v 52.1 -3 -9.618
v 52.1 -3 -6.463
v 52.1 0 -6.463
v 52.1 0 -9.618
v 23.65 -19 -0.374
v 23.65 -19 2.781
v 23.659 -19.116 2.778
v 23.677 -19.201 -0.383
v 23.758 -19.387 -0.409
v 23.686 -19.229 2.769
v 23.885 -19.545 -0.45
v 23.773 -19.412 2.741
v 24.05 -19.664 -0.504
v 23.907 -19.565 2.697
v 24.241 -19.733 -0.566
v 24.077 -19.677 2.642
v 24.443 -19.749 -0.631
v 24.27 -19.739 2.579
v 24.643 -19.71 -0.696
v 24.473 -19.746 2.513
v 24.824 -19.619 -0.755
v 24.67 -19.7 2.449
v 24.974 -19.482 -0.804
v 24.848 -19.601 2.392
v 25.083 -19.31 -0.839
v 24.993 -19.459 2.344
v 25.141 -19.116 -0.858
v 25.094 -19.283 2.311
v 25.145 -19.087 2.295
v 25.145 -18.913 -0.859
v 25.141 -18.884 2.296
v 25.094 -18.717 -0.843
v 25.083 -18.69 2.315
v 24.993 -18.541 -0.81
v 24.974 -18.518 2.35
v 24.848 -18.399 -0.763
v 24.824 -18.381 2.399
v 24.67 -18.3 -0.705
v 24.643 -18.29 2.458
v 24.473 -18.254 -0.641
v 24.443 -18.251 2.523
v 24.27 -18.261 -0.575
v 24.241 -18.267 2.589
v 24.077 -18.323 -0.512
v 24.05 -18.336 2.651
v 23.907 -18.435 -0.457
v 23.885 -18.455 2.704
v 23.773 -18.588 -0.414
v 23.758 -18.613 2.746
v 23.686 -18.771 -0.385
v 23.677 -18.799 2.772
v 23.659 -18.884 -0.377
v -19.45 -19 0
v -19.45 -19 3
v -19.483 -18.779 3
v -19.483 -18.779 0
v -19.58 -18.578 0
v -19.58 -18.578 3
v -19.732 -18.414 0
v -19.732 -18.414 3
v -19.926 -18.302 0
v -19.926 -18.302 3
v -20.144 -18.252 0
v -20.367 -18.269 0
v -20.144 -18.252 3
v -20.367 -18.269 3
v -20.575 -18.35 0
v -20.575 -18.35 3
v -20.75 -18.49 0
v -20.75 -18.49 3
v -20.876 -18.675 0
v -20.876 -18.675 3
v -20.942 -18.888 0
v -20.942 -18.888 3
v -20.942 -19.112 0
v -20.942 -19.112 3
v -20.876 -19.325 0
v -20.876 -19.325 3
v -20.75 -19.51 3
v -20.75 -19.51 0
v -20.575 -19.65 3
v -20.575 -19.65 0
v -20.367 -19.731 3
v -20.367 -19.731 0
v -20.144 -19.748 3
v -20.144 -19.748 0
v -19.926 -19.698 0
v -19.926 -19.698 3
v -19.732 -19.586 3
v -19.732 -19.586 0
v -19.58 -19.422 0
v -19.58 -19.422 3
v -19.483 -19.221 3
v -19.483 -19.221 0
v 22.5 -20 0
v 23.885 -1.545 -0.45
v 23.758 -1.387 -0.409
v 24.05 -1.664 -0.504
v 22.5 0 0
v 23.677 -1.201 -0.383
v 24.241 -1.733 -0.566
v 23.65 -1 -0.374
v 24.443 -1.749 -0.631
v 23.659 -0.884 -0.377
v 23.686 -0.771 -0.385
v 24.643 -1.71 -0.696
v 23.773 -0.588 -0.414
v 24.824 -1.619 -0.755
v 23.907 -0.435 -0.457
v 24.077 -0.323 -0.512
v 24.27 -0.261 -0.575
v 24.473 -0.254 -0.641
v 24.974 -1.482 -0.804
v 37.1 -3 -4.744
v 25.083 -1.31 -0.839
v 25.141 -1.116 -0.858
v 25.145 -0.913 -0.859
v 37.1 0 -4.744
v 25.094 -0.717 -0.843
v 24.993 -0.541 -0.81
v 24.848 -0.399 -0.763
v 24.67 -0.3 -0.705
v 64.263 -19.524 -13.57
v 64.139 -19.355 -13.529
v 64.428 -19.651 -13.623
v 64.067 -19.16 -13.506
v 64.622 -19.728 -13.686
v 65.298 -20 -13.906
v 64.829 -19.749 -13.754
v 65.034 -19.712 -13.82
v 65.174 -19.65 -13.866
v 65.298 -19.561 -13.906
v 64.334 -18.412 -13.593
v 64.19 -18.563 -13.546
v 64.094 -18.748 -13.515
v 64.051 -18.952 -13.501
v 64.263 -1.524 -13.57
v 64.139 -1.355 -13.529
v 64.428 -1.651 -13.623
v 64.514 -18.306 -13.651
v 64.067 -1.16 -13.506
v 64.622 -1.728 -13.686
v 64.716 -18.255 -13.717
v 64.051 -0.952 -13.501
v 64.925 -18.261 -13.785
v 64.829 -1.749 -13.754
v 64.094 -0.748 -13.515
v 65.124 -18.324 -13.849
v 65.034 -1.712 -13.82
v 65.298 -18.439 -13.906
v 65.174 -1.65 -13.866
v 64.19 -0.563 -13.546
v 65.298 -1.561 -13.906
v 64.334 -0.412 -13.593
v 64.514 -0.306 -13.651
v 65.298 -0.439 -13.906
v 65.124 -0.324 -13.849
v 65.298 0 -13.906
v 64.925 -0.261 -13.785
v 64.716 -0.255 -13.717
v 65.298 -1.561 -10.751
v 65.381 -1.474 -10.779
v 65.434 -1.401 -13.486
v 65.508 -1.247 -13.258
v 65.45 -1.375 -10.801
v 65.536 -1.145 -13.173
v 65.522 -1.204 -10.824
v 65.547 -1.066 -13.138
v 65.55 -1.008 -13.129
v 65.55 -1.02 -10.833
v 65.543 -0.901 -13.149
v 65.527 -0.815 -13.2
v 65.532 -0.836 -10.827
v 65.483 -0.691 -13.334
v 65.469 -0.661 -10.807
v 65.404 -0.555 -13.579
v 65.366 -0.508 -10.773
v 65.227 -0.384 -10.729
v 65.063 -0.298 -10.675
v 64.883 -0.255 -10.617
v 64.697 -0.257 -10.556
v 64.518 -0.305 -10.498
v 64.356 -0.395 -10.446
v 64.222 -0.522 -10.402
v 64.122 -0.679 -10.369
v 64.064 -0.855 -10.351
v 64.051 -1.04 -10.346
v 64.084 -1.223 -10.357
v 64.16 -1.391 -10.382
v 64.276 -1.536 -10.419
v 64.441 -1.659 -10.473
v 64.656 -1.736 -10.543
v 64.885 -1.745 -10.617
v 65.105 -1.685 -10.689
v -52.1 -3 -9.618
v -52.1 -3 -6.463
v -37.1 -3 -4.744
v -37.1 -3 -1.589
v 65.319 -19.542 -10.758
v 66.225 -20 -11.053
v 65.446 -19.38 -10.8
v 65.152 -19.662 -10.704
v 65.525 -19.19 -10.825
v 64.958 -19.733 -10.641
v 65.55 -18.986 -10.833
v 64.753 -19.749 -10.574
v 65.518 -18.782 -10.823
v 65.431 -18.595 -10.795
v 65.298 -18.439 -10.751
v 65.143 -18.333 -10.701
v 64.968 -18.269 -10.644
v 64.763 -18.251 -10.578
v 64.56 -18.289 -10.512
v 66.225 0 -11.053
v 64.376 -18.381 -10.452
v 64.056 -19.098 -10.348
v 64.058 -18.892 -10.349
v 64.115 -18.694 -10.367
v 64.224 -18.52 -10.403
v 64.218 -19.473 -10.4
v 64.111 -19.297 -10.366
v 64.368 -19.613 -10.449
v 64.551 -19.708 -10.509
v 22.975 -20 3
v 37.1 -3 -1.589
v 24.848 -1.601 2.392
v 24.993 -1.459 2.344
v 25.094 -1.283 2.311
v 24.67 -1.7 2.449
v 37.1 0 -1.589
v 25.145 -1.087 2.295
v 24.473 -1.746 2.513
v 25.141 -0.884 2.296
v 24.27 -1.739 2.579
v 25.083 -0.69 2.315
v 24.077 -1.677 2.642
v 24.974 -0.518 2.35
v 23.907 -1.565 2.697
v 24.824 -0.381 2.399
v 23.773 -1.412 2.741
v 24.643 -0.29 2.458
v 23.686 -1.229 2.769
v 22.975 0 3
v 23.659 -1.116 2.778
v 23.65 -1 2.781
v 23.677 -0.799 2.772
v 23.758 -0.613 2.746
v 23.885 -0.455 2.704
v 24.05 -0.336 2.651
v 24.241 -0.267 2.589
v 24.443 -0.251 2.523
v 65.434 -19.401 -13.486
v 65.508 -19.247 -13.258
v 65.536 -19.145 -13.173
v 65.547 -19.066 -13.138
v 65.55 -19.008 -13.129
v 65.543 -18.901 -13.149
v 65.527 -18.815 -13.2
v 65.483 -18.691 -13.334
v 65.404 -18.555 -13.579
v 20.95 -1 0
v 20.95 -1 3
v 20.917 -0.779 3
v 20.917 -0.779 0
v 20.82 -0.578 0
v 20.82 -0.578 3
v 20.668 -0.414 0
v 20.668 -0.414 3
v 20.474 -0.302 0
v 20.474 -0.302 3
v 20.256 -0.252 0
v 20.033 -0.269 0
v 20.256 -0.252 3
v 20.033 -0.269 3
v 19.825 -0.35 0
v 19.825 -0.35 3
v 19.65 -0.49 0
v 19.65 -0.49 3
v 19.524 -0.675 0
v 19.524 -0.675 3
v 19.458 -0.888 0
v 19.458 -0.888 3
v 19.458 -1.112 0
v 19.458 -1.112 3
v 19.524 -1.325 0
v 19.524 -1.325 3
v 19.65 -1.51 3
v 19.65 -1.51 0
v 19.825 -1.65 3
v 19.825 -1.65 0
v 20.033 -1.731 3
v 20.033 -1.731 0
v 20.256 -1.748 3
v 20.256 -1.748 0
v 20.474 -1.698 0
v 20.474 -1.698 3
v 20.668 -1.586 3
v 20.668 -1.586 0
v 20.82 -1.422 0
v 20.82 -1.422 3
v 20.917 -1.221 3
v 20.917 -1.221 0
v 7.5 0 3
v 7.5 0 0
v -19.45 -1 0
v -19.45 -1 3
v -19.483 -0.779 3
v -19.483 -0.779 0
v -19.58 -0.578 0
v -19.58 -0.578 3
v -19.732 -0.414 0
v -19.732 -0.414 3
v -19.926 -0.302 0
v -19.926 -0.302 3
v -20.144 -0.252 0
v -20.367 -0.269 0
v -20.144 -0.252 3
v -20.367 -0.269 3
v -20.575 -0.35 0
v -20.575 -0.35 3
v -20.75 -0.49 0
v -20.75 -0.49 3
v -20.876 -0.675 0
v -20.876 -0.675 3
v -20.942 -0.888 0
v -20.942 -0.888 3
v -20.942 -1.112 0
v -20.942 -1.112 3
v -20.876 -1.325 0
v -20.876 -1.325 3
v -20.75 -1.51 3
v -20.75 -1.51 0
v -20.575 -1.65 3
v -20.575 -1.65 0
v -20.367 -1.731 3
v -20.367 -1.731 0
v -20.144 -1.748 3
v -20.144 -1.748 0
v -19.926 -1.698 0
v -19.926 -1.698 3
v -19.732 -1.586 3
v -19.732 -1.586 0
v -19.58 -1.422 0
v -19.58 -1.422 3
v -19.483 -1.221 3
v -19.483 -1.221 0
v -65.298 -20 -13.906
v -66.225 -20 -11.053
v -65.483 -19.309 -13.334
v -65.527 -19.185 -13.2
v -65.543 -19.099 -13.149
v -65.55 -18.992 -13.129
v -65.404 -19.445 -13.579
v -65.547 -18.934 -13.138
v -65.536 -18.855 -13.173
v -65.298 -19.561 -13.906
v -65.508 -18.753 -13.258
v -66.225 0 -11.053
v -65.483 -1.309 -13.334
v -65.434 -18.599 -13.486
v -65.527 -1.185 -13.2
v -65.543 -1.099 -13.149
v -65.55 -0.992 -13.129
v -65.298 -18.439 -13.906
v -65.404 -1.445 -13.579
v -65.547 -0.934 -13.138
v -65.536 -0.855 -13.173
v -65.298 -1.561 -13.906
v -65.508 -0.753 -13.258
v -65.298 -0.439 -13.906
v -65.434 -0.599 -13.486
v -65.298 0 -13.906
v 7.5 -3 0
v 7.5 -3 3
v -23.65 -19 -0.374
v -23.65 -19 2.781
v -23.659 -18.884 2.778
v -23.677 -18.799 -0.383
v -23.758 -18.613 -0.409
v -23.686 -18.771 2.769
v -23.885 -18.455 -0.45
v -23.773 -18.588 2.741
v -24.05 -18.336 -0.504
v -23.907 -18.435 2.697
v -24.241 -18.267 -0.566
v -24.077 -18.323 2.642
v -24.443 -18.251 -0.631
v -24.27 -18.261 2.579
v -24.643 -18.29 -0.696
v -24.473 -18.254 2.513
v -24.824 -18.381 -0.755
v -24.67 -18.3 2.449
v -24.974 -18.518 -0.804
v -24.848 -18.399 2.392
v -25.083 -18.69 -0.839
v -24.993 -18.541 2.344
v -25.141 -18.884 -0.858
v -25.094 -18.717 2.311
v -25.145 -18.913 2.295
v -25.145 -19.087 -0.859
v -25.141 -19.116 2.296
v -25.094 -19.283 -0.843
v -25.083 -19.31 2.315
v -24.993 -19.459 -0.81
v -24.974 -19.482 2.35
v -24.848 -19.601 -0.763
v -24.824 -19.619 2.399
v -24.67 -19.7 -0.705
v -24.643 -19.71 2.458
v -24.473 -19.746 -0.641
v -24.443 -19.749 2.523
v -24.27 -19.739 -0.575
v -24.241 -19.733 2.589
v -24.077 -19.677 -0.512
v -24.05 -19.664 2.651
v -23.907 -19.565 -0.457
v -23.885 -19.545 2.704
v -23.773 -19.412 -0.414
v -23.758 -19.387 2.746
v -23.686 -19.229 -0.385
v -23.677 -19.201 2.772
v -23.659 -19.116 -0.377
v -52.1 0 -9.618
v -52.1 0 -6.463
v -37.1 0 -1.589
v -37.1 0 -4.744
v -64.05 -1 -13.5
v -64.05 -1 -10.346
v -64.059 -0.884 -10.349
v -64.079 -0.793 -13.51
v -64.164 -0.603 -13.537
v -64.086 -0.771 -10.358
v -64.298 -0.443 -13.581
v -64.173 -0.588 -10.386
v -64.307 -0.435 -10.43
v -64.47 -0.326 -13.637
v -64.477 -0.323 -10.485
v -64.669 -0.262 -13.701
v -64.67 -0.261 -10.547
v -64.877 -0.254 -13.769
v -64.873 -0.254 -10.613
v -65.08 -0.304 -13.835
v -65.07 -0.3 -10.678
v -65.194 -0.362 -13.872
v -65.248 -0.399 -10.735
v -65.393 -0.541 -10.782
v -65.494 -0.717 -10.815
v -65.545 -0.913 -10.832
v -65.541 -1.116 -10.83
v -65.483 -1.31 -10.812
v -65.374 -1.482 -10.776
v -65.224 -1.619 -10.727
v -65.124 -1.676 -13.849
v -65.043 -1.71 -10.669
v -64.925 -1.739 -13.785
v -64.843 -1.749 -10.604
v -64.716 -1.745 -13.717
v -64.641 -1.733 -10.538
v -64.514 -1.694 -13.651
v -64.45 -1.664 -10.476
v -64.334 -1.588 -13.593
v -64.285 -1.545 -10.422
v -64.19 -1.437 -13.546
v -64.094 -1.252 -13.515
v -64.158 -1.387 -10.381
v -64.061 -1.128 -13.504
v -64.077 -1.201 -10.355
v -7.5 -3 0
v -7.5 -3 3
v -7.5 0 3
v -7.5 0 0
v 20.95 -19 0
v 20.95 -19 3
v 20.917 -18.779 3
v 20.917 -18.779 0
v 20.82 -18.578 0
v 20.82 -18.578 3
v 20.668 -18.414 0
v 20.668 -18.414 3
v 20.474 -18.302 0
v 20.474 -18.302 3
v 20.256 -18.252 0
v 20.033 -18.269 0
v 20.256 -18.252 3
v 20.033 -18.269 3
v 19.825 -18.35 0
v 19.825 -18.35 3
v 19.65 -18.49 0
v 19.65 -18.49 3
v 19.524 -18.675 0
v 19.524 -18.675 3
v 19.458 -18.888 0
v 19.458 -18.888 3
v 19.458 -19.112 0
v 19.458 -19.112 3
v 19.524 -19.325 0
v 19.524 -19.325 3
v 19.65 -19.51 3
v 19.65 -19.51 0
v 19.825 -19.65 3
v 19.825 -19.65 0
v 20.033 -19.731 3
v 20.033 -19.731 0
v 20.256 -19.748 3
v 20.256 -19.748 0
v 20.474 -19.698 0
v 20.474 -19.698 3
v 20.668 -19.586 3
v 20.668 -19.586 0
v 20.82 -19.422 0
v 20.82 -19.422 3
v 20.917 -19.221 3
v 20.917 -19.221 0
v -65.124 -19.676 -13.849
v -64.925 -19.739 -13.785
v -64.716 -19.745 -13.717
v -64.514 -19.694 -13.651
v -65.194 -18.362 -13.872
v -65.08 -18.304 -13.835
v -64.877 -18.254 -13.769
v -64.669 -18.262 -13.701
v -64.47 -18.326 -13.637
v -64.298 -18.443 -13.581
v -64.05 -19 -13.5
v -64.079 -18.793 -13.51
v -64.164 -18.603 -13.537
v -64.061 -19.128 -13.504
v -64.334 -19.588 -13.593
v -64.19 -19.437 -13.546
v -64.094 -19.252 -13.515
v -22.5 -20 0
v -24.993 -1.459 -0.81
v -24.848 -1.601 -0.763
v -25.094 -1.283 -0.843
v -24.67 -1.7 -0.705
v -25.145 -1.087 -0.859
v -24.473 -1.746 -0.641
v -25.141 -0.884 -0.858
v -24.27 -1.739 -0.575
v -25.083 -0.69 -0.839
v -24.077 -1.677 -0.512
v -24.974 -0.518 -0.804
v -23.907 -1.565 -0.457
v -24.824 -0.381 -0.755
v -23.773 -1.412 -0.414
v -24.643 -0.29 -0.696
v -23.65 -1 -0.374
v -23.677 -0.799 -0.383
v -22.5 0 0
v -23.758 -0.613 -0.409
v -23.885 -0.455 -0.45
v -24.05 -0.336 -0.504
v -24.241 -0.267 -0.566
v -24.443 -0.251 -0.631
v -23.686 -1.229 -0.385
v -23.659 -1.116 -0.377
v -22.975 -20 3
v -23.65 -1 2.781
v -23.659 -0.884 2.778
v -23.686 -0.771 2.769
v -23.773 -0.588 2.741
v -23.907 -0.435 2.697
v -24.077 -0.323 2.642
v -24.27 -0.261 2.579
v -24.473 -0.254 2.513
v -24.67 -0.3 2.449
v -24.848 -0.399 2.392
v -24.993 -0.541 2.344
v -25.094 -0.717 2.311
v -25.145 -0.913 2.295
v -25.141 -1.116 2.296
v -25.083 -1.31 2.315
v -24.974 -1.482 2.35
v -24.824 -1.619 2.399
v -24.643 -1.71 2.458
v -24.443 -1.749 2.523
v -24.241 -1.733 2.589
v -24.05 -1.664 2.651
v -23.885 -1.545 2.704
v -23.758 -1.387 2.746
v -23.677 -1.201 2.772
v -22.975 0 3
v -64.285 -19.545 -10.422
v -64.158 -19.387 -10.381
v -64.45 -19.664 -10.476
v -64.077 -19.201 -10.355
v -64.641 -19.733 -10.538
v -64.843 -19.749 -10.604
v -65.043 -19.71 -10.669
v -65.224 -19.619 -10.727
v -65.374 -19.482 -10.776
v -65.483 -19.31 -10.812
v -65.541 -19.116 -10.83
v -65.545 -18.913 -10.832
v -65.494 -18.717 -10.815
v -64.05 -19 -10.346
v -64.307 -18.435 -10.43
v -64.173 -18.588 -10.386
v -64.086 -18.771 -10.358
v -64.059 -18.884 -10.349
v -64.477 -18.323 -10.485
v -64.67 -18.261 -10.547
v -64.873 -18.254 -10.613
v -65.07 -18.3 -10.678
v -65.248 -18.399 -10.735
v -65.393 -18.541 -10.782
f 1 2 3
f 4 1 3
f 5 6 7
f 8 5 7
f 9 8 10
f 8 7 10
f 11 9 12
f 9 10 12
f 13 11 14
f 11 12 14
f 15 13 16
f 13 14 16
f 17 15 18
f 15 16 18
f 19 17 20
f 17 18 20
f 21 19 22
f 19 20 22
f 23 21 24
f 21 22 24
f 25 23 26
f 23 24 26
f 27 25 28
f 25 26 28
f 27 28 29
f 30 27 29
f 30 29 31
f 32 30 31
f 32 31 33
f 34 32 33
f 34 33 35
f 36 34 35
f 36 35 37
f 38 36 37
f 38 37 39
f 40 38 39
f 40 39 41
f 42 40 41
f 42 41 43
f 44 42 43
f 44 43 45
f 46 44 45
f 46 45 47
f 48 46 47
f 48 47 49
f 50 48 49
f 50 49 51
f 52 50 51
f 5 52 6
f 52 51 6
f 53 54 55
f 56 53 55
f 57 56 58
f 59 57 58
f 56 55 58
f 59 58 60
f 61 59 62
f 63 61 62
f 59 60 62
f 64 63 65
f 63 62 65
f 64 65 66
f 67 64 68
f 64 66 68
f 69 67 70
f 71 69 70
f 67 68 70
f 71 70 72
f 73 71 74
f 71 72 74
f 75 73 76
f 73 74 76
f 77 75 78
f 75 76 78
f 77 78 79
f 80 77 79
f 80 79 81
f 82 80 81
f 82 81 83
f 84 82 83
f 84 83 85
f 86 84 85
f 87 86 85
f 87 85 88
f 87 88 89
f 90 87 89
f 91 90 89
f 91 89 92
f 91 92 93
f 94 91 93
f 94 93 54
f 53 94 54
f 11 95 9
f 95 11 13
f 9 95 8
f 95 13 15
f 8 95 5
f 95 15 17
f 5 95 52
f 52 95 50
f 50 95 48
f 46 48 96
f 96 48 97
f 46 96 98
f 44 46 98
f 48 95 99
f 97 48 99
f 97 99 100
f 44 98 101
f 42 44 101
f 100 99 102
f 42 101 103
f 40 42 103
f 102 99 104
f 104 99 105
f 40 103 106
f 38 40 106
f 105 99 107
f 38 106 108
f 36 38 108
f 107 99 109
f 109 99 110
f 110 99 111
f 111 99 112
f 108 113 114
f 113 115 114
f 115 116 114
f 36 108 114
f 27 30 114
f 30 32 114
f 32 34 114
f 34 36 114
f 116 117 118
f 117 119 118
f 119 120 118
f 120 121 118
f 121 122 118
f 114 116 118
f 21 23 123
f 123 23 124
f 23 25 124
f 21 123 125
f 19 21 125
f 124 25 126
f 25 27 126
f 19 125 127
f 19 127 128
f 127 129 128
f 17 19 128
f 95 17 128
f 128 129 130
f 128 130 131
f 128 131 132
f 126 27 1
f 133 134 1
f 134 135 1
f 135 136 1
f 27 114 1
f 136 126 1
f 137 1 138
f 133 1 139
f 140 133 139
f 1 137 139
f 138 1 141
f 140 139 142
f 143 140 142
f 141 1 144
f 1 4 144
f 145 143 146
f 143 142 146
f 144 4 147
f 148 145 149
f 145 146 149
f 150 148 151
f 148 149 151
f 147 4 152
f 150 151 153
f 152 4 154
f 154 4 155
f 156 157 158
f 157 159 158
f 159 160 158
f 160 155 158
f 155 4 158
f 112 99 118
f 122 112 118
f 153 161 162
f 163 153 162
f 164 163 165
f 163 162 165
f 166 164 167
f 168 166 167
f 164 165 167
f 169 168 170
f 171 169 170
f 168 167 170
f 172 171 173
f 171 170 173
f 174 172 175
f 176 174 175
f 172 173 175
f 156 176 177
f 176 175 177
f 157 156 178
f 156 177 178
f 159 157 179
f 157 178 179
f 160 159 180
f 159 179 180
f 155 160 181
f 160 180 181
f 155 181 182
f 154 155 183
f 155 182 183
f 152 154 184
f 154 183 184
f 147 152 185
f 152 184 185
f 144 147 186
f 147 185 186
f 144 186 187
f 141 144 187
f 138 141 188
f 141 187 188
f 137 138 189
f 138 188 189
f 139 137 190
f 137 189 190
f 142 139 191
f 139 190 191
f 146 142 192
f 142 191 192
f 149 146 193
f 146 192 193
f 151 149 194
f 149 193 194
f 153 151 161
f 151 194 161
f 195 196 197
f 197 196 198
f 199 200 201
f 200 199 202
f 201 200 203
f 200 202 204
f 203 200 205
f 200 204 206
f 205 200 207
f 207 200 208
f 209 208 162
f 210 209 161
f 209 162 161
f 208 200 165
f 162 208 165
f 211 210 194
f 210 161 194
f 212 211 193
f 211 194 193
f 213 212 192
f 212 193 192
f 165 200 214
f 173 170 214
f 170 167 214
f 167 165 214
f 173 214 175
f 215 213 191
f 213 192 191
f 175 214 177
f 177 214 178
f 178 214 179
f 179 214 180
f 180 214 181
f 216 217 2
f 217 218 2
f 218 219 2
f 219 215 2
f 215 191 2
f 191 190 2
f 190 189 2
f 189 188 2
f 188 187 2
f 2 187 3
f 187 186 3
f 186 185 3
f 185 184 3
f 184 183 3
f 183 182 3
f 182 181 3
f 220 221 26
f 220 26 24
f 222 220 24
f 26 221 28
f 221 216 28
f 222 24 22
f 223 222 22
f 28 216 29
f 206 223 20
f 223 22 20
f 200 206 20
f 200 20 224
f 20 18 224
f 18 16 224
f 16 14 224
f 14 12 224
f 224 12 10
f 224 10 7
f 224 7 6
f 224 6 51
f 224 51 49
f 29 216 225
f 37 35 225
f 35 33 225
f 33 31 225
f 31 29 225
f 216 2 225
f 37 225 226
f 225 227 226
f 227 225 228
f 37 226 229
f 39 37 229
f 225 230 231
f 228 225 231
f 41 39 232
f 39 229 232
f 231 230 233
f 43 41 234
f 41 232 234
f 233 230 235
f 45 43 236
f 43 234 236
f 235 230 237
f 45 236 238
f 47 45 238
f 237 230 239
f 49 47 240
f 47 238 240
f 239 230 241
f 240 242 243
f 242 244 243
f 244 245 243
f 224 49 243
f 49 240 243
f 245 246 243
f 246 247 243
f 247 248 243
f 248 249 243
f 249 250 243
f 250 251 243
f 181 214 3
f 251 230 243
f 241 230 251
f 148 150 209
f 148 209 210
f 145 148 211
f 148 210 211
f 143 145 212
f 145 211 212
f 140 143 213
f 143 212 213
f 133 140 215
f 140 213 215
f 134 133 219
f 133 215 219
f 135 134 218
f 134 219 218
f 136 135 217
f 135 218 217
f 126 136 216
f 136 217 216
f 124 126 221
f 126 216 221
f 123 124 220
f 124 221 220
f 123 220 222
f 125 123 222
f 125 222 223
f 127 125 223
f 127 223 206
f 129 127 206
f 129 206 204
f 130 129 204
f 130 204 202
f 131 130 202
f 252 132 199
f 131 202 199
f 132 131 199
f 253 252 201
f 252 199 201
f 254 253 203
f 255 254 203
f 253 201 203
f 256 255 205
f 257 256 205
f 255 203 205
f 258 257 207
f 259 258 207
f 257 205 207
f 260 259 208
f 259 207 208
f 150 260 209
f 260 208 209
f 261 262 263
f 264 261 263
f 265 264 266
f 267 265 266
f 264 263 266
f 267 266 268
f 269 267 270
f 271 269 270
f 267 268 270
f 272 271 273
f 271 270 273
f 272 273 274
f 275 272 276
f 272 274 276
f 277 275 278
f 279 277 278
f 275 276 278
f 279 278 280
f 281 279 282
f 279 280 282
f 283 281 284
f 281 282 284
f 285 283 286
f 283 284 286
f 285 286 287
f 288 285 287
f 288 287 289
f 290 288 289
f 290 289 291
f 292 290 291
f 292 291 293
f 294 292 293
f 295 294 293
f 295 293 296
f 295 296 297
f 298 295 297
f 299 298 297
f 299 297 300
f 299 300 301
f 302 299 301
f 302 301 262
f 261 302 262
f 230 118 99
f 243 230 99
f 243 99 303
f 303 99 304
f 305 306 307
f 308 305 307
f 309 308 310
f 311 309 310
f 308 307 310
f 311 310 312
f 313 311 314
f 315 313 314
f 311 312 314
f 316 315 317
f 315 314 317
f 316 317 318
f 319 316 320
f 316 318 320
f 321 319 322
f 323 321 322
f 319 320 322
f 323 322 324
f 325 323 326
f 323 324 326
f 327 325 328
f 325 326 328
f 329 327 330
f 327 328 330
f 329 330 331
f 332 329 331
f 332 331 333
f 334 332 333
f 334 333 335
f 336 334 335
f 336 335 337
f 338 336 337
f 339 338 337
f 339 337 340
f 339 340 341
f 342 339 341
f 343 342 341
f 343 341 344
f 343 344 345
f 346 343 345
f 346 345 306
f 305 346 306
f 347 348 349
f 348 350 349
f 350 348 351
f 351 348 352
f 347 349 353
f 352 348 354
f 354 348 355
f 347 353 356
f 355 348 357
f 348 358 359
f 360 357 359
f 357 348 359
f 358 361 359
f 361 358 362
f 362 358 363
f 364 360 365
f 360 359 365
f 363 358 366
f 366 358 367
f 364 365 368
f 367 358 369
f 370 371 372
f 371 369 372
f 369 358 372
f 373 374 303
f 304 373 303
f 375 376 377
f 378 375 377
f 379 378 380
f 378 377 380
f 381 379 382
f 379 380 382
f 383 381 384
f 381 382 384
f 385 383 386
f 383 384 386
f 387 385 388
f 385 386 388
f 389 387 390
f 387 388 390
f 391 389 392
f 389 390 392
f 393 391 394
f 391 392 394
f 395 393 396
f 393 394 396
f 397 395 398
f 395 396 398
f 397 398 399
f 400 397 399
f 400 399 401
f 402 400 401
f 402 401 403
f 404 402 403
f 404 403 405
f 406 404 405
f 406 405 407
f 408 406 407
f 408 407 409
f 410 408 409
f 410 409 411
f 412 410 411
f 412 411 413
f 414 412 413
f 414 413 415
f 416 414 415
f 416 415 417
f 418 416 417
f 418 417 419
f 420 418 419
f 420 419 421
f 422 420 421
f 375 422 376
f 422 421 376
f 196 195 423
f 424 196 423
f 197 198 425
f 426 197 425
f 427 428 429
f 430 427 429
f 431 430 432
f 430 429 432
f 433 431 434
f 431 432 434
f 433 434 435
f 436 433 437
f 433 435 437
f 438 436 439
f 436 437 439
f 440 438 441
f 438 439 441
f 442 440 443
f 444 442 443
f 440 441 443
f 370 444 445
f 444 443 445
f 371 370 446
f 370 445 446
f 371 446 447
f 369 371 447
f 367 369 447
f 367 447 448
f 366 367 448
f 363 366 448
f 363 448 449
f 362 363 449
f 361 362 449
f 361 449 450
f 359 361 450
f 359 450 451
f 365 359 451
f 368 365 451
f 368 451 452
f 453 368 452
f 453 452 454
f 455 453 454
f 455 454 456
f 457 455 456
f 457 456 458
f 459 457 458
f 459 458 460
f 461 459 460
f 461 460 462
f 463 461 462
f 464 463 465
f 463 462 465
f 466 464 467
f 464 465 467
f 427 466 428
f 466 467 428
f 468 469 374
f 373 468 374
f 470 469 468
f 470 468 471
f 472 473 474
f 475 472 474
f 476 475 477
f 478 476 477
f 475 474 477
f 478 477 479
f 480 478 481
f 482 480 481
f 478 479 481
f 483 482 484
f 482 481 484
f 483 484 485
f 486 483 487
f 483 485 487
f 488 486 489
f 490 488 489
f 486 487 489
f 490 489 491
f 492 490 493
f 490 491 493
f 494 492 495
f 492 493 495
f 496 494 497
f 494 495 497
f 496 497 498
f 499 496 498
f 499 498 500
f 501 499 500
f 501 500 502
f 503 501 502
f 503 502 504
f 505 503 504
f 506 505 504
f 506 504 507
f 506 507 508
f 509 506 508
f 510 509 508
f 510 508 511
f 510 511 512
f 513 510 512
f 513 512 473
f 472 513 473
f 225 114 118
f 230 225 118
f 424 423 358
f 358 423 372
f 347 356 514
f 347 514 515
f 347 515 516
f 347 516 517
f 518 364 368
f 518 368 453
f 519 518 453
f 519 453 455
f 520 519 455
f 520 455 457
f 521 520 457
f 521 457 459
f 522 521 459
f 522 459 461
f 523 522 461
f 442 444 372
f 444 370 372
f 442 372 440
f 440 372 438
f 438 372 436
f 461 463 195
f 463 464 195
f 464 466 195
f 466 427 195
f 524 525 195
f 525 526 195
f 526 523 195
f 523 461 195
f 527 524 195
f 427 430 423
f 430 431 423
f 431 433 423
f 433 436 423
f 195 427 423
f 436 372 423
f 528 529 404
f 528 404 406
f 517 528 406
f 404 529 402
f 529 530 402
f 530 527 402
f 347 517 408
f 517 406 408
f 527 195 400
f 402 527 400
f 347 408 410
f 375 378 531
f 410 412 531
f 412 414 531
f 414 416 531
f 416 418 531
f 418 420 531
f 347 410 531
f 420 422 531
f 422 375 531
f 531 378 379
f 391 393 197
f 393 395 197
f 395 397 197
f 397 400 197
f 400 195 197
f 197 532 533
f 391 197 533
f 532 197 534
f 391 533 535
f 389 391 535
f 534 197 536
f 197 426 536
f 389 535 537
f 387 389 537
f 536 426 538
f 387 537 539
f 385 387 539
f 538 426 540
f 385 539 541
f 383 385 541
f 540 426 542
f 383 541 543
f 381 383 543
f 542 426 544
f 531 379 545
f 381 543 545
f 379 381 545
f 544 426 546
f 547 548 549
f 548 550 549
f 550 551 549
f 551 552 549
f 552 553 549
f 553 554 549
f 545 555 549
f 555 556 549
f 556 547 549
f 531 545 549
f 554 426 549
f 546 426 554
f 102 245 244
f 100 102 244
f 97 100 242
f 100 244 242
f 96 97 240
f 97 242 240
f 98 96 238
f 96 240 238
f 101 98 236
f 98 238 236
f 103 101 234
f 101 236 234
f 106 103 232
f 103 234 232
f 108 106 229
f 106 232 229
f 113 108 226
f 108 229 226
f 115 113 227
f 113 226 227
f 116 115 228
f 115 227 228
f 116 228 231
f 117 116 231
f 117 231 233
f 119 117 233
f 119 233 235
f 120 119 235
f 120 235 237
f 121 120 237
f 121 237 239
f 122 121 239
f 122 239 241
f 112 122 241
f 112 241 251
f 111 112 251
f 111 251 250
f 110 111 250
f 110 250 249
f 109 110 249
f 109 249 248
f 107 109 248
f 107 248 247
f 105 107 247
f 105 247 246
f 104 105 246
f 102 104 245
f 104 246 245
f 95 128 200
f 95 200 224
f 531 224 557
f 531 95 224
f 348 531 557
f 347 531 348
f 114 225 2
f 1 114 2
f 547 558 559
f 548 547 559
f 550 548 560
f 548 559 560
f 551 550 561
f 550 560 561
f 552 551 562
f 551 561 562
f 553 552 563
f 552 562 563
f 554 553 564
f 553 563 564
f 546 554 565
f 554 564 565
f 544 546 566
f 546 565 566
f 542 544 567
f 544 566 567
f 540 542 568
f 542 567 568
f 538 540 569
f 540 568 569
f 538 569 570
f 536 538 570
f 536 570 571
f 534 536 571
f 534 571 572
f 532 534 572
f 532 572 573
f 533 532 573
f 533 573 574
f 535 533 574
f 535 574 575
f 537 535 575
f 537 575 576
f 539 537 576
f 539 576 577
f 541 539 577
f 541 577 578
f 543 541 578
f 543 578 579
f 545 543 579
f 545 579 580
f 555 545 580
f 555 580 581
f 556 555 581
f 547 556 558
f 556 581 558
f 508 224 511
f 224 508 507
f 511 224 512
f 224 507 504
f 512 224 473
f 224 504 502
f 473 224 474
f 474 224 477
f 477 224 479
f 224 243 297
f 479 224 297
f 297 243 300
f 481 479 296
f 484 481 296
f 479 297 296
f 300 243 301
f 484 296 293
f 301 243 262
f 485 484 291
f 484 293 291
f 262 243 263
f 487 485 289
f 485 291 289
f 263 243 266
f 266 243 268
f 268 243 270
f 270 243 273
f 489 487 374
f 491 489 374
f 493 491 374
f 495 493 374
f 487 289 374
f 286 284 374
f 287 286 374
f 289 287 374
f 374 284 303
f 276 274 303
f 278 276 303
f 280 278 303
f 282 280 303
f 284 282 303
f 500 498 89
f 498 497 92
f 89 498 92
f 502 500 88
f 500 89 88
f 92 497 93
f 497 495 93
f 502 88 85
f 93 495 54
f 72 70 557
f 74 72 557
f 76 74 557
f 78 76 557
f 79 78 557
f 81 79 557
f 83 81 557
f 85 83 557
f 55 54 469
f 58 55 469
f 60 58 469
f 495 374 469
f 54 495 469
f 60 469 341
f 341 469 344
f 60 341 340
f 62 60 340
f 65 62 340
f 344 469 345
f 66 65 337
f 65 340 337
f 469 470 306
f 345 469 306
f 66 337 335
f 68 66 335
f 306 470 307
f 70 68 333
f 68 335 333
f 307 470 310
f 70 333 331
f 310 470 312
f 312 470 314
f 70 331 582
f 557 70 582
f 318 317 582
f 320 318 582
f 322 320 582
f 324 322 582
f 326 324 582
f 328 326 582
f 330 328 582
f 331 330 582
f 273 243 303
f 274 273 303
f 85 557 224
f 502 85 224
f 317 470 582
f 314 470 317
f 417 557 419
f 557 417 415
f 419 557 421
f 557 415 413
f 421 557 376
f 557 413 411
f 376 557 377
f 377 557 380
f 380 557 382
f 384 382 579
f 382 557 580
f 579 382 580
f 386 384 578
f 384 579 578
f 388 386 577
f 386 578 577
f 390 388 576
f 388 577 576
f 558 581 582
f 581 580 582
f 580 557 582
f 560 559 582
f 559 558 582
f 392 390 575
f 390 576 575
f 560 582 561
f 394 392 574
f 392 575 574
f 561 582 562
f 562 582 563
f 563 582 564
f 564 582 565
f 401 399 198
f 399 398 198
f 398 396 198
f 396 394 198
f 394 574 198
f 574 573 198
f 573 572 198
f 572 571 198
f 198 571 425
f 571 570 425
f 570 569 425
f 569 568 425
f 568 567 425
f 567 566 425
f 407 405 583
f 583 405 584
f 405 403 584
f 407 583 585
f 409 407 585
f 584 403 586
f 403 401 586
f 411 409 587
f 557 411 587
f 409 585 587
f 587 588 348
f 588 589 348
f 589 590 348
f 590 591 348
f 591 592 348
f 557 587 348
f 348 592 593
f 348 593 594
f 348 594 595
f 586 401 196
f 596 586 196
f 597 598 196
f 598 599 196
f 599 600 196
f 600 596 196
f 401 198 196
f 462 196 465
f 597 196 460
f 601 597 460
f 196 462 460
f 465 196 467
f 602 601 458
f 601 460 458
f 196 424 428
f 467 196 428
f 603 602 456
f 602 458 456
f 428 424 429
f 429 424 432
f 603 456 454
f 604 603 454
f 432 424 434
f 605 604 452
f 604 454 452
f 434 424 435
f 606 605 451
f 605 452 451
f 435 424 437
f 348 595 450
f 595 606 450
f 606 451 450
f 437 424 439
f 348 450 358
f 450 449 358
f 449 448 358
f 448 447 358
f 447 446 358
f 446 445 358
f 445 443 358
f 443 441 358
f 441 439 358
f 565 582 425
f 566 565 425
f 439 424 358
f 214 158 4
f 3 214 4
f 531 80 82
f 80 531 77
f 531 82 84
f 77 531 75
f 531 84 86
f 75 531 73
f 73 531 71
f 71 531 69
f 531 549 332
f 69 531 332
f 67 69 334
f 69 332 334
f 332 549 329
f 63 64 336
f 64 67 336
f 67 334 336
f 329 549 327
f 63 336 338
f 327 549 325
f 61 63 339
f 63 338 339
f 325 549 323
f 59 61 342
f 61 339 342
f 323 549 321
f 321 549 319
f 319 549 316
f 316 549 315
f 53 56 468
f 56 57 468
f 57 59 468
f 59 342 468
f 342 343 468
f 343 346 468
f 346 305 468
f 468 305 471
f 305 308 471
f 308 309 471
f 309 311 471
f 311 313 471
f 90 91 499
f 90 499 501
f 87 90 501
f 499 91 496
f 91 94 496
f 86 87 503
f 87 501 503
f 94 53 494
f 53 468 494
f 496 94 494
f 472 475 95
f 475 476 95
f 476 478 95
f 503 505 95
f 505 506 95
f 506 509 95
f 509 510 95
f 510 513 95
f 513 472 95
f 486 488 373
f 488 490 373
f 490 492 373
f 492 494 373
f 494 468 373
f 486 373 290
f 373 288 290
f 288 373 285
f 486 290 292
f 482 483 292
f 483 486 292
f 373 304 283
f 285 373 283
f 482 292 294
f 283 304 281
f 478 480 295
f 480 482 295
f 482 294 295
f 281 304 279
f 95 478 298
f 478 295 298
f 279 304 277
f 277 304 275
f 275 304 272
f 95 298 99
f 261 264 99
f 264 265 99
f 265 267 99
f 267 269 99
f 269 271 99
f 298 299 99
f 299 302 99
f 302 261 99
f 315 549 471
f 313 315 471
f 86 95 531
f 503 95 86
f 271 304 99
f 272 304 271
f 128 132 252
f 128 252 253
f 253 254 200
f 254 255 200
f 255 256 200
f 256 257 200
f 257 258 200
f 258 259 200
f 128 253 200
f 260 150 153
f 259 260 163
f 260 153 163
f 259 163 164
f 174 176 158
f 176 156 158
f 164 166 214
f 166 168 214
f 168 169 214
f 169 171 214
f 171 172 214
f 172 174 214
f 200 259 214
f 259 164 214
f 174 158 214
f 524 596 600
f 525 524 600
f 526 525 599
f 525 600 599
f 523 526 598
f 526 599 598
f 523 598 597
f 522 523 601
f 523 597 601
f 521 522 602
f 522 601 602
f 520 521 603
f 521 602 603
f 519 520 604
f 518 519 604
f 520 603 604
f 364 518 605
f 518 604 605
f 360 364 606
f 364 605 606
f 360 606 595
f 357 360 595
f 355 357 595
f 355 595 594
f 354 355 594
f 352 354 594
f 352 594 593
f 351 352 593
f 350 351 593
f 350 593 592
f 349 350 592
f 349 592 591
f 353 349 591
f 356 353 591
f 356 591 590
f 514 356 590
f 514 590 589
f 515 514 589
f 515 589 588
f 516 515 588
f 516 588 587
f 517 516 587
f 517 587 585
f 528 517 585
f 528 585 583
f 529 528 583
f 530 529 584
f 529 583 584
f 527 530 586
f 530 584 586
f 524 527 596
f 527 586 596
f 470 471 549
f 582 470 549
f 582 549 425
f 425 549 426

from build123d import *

# Parameters (mm, degrees)
EXTRUDE_THIN1_DEPTH = 20
SKETCH3_R           = 0.75
SKETCH3_W           = 15
SKETCH3_H           = 3
CUT_EXTRUDE1_DEPTH  = 72.214477186


with BuildPart() as part:
    # Sketch2 → Extrude-Thin1 (new body)
    with BuildSketch(Plane(origin=(0, 0, 0), x_dir=(1, 0, 0), z_dir=(0, 1, 0))):
        Polygon((-65.297543233, 13.905764747), (-22.5, 0), (22.5, 0), (65.297543233, 13.905764747), (66.224594216, 11.052595198), (22.975153321, -3), (-22.975153321, -3), (-66.224594216, 11.052595198), align=None)
    extrude(amount=-EXTRUDE_THIN1_DEPTH)

    # Sketch3 → Cut-Extrude1 (cut, through all)
    with BuildSketch(Plane.XY.offset(3)):
        with Locations((-64.799873769, -1)):
            Circle(SKETCH3_R)
        with Locations((-24.399873769, -1)):
            Circle(SKETCH3_R)
        with Locations((-24.399873769, -19)):
            Circle(SKETCH3_R)
        with Locations((-64.799873769, -19)):
            Circle(SKETCH3_R)
        with Locations(Location((64.799873769, -1, 0), (0, 0, 311.57189246))):
            Circle(SKETCH3_R)
        with Locations(Location((24.399873769, -1, 0), (0, 0, 180))):
            Circle(SKETCH3_R)
        with Locations(Location((24.399873769, -19, 0), (0, 0, 180))):
            Circle(SKETCH3_R)
        with Locations(Location((64.799873769, -19, 0), (0, 0, 48.42810754))):
            Circle(SKETCH3_R)
        with Locations((-20.2, -1)):
            Circle(SKETCH3_R)
        with Locations((-20.2, -19)):
            Circle(SKETCH3_R)
        with Locations((20.2, -19)):
            Circle(SKETCH3_R)
        with Locations((20.2, -1)):
            Circle(SKETCH3_R)
        with Locations((0, -1.5)):
            Rectangle(SKETCH3_W, SKETCH3_H)
        with Locations((44.599873769, -1.5)):
            Rectangle(SKETCH3_W, SKETCH3_H)
        with Locations((-44.599873769, -1.5)):
            Rectangle(SKETCH3_W, SKETCH3_H)
    extrude(amount=-CUT_EXTRUDE1_DEPTH, mode=Mode.SUBTRACT)


solid = part.part
